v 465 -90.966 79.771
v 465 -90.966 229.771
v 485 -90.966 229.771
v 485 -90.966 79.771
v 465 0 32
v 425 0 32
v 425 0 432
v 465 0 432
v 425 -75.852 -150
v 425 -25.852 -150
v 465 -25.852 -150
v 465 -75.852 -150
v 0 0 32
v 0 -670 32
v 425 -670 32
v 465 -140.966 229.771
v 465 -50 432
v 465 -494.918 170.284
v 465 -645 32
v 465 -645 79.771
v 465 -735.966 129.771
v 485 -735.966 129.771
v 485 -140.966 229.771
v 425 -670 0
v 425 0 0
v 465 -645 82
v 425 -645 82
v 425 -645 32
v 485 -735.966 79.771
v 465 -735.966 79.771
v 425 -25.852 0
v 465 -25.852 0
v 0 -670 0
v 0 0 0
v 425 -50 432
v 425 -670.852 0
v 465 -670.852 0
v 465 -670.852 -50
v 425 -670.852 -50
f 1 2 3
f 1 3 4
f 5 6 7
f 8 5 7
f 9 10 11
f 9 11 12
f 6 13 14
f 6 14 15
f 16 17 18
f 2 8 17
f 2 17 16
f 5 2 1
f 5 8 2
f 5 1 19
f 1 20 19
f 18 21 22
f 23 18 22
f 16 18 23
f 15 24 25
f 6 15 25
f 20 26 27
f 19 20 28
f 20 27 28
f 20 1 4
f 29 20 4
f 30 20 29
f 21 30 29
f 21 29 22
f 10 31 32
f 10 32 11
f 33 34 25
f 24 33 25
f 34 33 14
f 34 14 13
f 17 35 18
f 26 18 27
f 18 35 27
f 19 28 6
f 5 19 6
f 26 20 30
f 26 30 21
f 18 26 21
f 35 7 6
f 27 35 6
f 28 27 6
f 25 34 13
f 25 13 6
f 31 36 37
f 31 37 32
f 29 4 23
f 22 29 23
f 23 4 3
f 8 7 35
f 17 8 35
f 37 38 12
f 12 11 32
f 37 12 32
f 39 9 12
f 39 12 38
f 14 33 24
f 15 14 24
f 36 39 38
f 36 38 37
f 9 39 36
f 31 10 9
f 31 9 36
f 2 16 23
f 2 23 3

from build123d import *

# Parameters (mm, degrees)
SKETCH1_W             = 425
SKETCH1_H             = 670
BOSS_EXTRUDE1_DEPTH   = 32
BOSS_EXTRUDE2_DEPTH   = 40
BOSS_EXTRUDE2_2_DEPTH = 40
BOSS_EXTRUDE3_DEPTH   = 20


with BuildPart() as part:
    # Sketch1 → Boss-Extrude1 (new body)
    with BuildSketch(Plane.XY):
        with Locations((212.5, -335)):
            Rectangle(SKETCH1_W, SKETCH1_H)
    extrude(amount=BOSS_EXTRUDE1_DEPTH)


with BuildPart() as body_2:
    # Sketch3 → Boss-Extrude2 (new body)
    with BuildSketch(Plane(origin=(425, 0, 0), x_dir=(0, 0, -1), z_dir=(1, 0, 0))):
        Polygon((-32, 0), (-432, 0), (-432, -50), (-82, -645), (-32, -645), align=None)
    extrude(amount=BOSS_EXTRUDE2_DEPTH)

    # Sketch4 → Boss-Extrude3 (add)
    with BuildSketch(Plane(origin=(465, 0, 0), x_dir=(0, 0, -1), z_dir=(1, 0, 0))):
        Polygon((-229.771365321, -90.966417035), (-79.771365321, -90.966417035), (-79.771365321, -735.966417035), (-129.771365321, -735.966417035), (-229.771365321, -140.966417035), align=None)
    extrude(amount=BOSS_EXTRUDE3_DEPTH)


with BuildPart() as body_3:
    # Sketch3 → Boss-Extrude2 2 (new body)
    with BuildSketch(Plane(origin=(425, 0, 0), x_dir=(0, 0, -1), z_dir=(1, 0, 0))):
        Polygon((0, -25.851907968), (150, -25.851907968), (150, -75.851907968), (50, -670.851907968), (0, -670.851907968), align=None)
    extrude(amount=BOSS_EXTRUDE2_2_DEPTH)


solid = Compound([part.part, body_2.part, body_3.part])
